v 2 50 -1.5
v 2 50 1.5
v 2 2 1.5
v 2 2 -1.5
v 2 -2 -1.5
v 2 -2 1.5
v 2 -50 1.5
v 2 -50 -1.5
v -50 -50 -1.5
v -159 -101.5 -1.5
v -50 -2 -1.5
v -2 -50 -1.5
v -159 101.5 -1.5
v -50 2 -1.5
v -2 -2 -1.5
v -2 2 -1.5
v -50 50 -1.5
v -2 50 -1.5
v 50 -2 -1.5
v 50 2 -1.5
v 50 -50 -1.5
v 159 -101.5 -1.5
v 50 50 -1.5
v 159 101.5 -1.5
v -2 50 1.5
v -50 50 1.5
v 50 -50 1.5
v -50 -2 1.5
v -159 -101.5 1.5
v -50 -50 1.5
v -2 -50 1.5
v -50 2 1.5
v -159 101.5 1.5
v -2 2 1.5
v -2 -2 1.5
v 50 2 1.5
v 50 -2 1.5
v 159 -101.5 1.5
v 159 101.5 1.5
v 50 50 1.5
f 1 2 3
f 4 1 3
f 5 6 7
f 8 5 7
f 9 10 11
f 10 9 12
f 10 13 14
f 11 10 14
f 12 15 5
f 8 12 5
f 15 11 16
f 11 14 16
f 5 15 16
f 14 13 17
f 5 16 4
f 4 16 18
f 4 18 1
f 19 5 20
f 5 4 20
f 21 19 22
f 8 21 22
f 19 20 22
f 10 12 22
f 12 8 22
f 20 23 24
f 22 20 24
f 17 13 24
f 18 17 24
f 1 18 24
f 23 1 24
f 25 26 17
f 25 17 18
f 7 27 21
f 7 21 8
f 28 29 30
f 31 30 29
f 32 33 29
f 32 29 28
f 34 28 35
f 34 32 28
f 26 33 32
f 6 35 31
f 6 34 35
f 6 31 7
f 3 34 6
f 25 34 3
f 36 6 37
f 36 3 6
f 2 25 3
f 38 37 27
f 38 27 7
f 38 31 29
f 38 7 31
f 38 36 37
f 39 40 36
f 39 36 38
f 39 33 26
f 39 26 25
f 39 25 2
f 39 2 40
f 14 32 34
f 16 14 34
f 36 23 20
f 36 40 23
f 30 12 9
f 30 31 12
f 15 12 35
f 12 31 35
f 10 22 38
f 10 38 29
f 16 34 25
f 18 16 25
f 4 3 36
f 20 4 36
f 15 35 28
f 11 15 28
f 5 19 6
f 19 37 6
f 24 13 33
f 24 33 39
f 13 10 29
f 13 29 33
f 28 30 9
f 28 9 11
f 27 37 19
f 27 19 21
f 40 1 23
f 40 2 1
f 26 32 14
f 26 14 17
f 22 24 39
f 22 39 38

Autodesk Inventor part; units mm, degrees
ref_plane "YZ Plane" through (0, 0, 0) normal (1, 0, 0) x (0, 1, 0)
ref_plane "XZ Plane" through (0, 0, 0) normal (0, 1, 0) x (-1, 0, 0)
ref_plane "XY Plane" through (0, 0, 0) normal (0, 0, 1) x (1, 0, 0)
sketch "Szkic1" plane through (0, 0, 0) normal (0, 0, 1) x (1, 0, 0)
  line L0 (-159, 101.5) -> (159, 101.5)
  line L1 (159, 101.5) -> (159, -101.5)
  line L2 (159, -101.5) -> (-159, -101.5)
  line L3 (-159, -101.5) -> (-159, 101.5)
  line L4 (-159, 101.5) -> (159, -101.5) construction
  line L5 (159, 101.5) -> (-159, -101.5) construction
  point P0 (0, 0)
  dimension "d0" = 318
  dimension "d1" = 203
extrude "Wyciągnięcie proste1" add sketch "Szkic1" along normal mid plane 3
sketch "Szkic2" plane through (0, 0, 1.5) normal (0, 0, 1) x (1, 0, 0)
  line L0 (50, -50) -> (-50, -50)
  line L1 (-50, -50) -> (-50, 50)
  line L2 (-50, 50) -> (50, 50)
  line L3 (50, 50) -> (50, -50)
  line L4 (50, -50) -> (-50, 50) construction
  line L5 (-50, -50) -> (50, 50) construction
  line L6 (-2, 50) -> (2, 50)
  line L7 (2, 50) -> (2, -50)
  line L8 (2, -50) -> (-2, -50)
  line L9 (-2, -50) -> (-2, 50)
  line L10 (-50, 2) -> (50, 2)
  line L11 (50, 2) -> (50, -2)
  line L12 (50, -2) -> (-50, -2)
  line L13 (-50, -2) -> (-50, 2)
  line L14 (159, -101.5) -> (159, 101.5) projected
  line L15 (159, 101.5) -> (-159, 101.5) projected
  point P0 (0, 0)
  point P1 (2, -2)
  point P2 (-2, -2)
  point P3 (-50, -2)
  point P4 (-2, -50)
  point P5 (2, 2)
  point P6 (50, 2)
  point P7 (2, 50)
  point P8 (-2, 2)
  dimension "d4" = 100
  dimension "d5" = 100
  dimension "d6" = 4
  dimension "d7" = 100
  dimension "d8" = 48
  dimension "d9" = 4
  dimension "d10" = 48
extrude "Wyciągnięcie proste2" cut sketch "Szkic2" against normal through all contours L0 L7 L12 L3 | L0 L1 L12 L9 | L10 L7 L2 L3 | L10 L1 L2 L9
properties part number "LeftWall_Window"
